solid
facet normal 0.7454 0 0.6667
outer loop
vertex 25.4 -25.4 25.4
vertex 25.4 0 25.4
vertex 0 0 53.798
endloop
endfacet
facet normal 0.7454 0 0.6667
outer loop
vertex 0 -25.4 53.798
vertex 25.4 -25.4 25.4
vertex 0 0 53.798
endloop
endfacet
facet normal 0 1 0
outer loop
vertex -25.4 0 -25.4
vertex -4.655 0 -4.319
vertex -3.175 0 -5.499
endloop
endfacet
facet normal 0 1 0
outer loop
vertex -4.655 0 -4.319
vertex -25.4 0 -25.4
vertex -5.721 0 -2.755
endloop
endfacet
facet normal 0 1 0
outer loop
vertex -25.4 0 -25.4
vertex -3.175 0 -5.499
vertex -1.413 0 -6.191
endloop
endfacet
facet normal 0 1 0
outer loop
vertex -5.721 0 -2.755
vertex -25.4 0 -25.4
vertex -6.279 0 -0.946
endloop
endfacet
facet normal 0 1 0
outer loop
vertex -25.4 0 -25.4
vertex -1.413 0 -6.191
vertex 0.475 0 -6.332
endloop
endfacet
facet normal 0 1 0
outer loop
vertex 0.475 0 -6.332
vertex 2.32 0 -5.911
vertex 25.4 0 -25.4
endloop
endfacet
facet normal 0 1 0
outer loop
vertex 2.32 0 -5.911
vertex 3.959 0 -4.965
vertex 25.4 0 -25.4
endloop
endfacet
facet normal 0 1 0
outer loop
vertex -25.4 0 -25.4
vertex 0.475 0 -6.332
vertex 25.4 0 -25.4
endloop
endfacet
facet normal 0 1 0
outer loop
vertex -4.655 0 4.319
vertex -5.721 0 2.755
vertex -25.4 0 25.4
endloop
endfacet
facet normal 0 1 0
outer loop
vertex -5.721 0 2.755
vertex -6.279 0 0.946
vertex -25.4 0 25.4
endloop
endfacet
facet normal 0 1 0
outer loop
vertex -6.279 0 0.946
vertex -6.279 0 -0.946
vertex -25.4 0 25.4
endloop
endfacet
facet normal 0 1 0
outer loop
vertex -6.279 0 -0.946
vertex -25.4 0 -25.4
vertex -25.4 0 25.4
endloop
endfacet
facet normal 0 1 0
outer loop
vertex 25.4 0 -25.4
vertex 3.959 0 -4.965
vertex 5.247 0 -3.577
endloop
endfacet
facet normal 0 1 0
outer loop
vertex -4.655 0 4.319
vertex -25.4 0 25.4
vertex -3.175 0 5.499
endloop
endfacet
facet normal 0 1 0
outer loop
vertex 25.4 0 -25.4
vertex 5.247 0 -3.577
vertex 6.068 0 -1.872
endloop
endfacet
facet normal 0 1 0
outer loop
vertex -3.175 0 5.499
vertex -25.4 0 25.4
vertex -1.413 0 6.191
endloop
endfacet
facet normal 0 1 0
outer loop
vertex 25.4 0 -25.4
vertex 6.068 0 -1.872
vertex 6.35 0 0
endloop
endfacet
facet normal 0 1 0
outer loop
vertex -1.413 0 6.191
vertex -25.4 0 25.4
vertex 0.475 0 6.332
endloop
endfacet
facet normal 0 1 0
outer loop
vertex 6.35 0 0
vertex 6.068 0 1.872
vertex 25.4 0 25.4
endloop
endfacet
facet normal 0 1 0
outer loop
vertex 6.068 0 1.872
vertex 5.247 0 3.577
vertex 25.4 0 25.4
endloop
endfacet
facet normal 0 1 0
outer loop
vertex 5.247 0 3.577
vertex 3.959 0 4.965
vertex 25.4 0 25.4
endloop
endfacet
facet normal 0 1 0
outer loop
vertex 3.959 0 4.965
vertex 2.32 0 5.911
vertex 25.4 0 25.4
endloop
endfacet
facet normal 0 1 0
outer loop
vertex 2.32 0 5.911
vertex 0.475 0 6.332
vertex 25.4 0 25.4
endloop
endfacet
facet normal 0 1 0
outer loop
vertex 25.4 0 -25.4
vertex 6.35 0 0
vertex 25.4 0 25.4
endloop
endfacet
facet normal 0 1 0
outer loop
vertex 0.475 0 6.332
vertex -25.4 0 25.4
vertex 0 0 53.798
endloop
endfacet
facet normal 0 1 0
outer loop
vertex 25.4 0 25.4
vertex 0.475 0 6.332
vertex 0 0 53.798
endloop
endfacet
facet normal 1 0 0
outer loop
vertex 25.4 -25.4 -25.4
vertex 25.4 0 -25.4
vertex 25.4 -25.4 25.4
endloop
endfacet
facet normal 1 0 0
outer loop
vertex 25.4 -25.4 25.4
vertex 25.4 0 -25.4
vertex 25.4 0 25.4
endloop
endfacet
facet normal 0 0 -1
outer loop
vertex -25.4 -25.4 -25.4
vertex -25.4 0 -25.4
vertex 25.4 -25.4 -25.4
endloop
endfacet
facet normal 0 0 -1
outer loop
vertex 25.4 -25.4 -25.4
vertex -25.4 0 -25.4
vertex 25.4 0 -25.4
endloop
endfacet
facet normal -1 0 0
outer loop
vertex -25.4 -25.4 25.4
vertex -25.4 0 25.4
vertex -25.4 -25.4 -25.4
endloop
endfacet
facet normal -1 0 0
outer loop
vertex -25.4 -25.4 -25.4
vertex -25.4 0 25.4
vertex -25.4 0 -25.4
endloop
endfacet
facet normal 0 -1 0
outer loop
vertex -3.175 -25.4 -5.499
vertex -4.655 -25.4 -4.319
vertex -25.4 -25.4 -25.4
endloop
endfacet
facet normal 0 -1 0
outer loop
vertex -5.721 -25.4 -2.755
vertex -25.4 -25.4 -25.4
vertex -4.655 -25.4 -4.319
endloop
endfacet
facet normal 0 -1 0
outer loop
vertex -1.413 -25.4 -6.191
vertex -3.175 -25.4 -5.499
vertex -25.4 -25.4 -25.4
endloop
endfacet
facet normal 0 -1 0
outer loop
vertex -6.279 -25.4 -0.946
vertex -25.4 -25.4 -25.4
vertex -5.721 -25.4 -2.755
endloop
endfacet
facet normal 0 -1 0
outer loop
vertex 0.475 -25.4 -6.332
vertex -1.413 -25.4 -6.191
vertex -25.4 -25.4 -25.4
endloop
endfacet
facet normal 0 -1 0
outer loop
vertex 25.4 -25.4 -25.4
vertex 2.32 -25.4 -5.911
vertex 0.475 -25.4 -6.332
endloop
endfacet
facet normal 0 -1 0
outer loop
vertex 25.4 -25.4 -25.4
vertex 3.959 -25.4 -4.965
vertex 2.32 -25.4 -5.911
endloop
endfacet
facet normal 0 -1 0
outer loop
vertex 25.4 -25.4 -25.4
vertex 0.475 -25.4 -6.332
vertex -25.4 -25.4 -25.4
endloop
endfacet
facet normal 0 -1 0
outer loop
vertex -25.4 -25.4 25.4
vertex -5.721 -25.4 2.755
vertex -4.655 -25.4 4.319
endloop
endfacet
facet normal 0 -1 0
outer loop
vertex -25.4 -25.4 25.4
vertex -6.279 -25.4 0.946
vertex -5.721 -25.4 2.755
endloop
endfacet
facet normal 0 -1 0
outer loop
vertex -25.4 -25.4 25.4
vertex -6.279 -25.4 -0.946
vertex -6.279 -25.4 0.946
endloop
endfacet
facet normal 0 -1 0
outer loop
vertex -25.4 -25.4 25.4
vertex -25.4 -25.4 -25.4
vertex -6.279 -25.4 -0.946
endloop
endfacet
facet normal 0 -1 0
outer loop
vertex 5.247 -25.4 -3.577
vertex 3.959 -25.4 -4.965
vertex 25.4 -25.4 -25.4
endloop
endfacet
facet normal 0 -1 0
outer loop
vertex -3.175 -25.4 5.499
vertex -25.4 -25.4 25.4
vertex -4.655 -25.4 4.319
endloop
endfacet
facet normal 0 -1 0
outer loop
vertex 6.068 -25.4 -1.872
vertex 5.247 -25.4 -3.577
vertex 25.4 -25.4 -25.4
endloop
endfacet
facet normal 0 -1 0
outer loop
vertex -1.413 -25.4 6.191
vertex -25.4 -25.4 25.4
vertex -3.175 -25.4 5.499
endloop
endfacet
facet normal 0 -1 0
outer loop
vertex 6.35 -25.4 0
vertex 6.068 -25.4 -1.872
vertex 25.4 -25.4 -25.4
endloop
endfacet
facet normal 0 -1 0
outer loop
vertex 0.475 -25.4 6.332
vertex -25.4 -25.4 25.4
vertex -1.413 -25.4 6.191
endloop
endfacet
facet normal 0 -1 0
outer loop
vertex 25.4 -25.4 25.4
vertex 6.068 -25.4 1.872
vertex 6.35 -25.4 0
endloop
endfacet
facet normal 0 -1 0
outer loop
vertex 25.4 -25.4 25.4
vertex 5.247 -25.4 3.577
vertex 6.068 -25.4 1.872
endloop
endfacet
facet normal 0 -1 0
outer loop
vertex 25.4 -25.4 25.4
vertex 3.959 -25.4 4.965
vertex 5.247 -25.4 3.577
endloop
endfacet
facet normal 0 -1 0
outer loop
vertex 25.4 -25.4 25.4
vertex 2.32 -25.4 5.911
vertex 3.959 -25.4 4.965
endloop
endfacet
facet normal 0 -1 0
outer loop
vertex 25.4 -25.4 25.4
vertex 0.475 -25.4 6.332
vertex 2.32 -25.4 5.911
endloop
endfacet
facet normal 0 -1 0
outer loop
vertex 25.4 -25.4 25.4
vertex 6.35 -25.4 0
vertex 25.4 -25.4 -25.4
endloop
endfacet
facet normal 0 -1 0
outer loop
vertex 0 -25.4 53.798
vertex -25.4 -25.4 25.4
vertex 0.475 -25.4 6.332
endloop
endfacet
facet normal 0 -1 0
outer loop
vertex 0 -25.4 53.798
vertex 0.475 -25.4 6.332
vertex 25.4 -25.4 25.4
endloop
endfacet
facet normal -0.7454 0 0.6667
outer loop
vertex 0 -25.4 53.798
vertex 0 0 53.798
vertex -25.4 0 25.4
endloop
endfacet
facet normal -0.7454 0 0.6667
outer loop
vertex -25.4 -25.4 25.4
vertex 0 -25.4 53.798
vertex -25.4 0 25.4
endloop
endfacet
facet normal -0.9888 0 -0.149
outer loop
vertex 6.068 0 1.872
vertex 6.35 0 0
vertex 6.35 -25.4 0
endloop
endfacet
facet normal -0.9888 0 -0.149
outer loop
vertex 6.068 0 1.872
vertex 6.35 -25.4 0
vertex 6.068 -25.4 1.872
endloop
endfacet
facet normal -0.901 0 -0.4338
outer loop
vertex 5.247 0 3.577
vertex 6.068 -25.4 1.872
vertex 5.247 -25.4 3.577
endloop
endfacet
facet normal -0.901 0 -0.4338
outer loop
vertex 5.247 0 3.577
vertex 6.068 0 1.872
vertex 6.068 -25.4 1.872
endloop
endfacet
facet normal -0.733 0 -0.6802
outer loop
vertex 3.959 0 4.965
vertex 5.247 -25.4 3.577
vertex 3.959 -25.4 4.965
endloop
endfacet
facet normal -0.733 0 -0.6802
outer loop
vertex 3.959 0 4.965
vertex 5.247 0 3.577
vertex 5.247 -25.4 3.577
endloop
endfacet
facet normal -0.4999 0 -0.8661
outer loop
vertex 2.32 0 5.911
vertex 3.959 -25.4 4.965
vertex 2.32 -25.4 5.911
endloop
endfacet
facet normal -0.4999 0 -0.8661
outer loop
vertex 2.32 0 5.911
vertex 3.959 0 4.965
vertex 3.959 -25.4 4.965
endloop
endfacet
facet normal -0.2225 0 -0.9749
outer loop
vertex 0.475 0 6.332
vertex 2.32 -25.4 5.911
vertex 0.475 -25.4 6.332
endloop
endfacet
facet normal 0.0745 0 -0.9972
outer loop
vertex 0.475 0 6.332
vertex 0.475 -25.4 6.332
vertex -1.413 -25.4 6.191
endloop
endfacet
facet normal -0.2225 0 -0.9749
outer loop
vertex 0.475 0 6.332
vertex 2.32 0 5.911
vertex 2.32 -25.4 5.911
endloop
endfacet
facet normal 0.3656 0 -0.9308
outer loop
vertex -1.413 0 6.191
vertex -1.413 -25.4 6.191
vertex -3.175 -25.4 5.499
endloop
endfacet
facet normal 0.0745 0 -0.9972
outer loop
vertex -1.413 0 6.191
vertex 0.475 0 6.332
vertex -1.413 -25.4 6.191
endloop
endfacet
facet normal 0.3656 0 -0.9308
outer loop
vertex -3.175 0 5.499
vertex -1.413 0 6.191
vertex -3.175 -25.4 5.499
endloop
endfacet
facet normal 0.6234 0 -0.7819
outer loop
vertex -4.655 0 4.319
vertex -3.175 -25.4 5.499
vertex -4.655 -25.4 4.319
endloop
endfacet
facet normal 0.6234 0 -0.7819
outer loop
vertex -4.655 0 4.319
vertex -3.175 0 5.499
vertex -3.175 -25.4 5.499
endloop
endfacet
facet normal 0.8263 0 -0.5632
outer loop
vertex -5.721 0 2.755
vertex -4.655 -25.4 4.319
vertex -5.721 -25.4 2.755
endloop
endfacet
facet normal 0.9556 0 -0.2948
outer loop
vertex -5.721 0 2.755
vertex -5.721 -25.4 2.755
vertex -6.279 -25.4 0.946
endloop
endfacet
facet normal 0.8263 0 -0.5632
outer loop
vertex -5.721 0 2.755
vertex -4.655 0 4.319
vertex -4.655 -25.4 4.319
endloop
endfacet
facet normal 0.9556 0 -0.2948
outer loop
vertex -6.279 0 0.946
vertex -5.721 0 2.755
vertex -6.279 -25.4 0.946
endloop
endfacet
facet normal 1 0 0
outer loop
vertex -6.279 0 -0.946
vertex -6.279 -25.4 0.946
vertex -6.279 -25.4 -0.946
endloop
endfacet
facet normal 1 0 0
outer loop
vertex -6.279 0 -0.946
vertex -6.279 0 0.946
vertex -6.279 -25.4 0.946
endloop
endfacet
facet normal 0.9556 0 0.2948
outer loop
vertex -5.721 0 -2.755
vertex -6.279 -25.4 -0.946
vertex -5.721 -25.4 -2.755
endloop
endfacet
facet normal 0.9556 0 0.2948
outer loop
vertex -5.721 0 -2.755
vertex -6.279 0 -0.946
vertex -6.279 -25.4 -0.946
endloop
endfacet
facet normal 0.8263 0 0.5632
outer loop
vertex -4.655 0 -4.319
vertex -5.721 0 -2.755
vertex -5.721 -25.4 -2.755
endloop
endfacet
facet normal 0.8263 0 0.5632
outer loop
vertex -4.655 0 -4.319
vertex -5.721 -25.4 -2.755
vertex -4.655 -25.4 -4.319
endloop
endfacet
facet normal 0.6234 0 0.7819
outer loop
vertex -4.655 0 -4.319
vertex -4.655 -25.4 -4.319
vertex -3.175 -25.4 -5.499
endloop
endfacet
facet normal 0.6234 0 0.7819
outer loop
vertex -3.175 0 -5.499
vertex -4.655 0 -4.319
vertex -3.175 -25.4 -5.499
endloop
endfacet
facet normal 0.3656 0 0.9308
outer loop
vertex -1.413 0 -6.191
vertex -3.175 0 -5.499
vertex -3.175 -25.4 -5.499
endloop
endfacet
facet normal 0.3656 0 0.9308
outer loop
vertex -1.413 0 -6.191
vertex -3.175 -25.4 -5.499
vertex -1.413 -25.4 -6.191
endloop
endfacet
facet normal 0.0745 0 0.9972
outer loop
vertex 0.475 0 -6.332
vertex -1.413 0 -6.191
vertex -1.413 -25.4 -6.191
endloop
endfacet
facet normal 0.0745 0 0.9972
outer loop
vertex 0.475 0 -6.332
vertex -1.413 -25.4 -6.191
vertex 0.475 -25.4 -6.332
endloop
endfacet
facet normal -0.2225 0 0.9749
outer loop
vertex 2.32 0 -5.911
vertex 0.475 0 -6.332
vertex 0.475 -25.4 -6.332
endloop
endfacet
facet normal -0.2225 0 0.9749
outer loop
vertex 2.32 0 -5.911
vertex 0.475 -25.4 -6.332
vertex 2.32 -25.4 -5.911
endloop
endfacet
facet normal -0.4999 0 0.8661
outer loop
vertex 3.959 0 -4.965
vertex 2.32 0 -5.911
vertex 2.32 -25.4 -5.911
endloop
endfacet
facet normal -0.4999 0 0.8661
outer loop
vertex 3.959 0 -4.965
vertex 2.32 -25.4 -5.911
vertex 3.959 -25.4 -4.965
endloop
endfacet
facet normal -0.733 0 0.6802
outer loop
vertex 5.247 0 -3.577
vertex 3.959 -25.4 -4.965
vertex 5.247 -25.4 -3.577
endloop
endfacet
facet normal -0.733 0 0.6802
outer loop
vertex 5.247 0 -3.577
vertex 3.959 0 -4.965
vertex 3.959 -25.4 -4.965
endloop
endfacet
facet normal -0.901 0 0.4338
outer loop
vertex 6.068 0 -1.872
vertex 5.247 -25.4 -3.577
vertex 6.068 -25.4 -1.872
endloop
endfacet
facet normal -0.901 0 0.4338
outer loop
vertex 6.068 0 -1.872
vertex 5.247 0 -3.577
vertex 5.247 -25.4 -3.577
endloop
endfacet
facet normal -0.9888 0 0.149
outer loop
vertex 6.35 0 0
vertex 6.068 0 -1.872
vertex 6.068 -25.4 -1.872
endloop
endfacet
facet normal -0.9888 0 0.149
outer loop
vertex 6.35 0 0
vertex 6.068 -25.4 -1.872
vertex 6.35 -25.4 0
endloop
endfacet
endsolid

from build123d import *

# Parameters (mm, degrees)
F0_W     = 19.05
F0_H     = 19.05
F0_R     = 6.35
F1_DEPTH = 25.4


with BuildPart() as f1:
    # F0 (on Front) → F1 (new body)
    with BuildSketch(Plane.XZ):
        with Locations((-15.875, -15.875)):
            Rectangle(F0_W, F0_H)
        Polygon((-6.35, -6.35), (-6.35, -25.4), (25.4, -25.4), (25.4, 25.4), (-25.4, 25.4), (-25.4, -6.35), align=None)
        Circle(F0_R, mode=Mode.SUBTRACT)
        Polygon((0, 53.798063), (-25.4, 25.4), (25.4, 25.4), align=None)
    extrude(amount=F1_DEPTH)


solid = f1.part
